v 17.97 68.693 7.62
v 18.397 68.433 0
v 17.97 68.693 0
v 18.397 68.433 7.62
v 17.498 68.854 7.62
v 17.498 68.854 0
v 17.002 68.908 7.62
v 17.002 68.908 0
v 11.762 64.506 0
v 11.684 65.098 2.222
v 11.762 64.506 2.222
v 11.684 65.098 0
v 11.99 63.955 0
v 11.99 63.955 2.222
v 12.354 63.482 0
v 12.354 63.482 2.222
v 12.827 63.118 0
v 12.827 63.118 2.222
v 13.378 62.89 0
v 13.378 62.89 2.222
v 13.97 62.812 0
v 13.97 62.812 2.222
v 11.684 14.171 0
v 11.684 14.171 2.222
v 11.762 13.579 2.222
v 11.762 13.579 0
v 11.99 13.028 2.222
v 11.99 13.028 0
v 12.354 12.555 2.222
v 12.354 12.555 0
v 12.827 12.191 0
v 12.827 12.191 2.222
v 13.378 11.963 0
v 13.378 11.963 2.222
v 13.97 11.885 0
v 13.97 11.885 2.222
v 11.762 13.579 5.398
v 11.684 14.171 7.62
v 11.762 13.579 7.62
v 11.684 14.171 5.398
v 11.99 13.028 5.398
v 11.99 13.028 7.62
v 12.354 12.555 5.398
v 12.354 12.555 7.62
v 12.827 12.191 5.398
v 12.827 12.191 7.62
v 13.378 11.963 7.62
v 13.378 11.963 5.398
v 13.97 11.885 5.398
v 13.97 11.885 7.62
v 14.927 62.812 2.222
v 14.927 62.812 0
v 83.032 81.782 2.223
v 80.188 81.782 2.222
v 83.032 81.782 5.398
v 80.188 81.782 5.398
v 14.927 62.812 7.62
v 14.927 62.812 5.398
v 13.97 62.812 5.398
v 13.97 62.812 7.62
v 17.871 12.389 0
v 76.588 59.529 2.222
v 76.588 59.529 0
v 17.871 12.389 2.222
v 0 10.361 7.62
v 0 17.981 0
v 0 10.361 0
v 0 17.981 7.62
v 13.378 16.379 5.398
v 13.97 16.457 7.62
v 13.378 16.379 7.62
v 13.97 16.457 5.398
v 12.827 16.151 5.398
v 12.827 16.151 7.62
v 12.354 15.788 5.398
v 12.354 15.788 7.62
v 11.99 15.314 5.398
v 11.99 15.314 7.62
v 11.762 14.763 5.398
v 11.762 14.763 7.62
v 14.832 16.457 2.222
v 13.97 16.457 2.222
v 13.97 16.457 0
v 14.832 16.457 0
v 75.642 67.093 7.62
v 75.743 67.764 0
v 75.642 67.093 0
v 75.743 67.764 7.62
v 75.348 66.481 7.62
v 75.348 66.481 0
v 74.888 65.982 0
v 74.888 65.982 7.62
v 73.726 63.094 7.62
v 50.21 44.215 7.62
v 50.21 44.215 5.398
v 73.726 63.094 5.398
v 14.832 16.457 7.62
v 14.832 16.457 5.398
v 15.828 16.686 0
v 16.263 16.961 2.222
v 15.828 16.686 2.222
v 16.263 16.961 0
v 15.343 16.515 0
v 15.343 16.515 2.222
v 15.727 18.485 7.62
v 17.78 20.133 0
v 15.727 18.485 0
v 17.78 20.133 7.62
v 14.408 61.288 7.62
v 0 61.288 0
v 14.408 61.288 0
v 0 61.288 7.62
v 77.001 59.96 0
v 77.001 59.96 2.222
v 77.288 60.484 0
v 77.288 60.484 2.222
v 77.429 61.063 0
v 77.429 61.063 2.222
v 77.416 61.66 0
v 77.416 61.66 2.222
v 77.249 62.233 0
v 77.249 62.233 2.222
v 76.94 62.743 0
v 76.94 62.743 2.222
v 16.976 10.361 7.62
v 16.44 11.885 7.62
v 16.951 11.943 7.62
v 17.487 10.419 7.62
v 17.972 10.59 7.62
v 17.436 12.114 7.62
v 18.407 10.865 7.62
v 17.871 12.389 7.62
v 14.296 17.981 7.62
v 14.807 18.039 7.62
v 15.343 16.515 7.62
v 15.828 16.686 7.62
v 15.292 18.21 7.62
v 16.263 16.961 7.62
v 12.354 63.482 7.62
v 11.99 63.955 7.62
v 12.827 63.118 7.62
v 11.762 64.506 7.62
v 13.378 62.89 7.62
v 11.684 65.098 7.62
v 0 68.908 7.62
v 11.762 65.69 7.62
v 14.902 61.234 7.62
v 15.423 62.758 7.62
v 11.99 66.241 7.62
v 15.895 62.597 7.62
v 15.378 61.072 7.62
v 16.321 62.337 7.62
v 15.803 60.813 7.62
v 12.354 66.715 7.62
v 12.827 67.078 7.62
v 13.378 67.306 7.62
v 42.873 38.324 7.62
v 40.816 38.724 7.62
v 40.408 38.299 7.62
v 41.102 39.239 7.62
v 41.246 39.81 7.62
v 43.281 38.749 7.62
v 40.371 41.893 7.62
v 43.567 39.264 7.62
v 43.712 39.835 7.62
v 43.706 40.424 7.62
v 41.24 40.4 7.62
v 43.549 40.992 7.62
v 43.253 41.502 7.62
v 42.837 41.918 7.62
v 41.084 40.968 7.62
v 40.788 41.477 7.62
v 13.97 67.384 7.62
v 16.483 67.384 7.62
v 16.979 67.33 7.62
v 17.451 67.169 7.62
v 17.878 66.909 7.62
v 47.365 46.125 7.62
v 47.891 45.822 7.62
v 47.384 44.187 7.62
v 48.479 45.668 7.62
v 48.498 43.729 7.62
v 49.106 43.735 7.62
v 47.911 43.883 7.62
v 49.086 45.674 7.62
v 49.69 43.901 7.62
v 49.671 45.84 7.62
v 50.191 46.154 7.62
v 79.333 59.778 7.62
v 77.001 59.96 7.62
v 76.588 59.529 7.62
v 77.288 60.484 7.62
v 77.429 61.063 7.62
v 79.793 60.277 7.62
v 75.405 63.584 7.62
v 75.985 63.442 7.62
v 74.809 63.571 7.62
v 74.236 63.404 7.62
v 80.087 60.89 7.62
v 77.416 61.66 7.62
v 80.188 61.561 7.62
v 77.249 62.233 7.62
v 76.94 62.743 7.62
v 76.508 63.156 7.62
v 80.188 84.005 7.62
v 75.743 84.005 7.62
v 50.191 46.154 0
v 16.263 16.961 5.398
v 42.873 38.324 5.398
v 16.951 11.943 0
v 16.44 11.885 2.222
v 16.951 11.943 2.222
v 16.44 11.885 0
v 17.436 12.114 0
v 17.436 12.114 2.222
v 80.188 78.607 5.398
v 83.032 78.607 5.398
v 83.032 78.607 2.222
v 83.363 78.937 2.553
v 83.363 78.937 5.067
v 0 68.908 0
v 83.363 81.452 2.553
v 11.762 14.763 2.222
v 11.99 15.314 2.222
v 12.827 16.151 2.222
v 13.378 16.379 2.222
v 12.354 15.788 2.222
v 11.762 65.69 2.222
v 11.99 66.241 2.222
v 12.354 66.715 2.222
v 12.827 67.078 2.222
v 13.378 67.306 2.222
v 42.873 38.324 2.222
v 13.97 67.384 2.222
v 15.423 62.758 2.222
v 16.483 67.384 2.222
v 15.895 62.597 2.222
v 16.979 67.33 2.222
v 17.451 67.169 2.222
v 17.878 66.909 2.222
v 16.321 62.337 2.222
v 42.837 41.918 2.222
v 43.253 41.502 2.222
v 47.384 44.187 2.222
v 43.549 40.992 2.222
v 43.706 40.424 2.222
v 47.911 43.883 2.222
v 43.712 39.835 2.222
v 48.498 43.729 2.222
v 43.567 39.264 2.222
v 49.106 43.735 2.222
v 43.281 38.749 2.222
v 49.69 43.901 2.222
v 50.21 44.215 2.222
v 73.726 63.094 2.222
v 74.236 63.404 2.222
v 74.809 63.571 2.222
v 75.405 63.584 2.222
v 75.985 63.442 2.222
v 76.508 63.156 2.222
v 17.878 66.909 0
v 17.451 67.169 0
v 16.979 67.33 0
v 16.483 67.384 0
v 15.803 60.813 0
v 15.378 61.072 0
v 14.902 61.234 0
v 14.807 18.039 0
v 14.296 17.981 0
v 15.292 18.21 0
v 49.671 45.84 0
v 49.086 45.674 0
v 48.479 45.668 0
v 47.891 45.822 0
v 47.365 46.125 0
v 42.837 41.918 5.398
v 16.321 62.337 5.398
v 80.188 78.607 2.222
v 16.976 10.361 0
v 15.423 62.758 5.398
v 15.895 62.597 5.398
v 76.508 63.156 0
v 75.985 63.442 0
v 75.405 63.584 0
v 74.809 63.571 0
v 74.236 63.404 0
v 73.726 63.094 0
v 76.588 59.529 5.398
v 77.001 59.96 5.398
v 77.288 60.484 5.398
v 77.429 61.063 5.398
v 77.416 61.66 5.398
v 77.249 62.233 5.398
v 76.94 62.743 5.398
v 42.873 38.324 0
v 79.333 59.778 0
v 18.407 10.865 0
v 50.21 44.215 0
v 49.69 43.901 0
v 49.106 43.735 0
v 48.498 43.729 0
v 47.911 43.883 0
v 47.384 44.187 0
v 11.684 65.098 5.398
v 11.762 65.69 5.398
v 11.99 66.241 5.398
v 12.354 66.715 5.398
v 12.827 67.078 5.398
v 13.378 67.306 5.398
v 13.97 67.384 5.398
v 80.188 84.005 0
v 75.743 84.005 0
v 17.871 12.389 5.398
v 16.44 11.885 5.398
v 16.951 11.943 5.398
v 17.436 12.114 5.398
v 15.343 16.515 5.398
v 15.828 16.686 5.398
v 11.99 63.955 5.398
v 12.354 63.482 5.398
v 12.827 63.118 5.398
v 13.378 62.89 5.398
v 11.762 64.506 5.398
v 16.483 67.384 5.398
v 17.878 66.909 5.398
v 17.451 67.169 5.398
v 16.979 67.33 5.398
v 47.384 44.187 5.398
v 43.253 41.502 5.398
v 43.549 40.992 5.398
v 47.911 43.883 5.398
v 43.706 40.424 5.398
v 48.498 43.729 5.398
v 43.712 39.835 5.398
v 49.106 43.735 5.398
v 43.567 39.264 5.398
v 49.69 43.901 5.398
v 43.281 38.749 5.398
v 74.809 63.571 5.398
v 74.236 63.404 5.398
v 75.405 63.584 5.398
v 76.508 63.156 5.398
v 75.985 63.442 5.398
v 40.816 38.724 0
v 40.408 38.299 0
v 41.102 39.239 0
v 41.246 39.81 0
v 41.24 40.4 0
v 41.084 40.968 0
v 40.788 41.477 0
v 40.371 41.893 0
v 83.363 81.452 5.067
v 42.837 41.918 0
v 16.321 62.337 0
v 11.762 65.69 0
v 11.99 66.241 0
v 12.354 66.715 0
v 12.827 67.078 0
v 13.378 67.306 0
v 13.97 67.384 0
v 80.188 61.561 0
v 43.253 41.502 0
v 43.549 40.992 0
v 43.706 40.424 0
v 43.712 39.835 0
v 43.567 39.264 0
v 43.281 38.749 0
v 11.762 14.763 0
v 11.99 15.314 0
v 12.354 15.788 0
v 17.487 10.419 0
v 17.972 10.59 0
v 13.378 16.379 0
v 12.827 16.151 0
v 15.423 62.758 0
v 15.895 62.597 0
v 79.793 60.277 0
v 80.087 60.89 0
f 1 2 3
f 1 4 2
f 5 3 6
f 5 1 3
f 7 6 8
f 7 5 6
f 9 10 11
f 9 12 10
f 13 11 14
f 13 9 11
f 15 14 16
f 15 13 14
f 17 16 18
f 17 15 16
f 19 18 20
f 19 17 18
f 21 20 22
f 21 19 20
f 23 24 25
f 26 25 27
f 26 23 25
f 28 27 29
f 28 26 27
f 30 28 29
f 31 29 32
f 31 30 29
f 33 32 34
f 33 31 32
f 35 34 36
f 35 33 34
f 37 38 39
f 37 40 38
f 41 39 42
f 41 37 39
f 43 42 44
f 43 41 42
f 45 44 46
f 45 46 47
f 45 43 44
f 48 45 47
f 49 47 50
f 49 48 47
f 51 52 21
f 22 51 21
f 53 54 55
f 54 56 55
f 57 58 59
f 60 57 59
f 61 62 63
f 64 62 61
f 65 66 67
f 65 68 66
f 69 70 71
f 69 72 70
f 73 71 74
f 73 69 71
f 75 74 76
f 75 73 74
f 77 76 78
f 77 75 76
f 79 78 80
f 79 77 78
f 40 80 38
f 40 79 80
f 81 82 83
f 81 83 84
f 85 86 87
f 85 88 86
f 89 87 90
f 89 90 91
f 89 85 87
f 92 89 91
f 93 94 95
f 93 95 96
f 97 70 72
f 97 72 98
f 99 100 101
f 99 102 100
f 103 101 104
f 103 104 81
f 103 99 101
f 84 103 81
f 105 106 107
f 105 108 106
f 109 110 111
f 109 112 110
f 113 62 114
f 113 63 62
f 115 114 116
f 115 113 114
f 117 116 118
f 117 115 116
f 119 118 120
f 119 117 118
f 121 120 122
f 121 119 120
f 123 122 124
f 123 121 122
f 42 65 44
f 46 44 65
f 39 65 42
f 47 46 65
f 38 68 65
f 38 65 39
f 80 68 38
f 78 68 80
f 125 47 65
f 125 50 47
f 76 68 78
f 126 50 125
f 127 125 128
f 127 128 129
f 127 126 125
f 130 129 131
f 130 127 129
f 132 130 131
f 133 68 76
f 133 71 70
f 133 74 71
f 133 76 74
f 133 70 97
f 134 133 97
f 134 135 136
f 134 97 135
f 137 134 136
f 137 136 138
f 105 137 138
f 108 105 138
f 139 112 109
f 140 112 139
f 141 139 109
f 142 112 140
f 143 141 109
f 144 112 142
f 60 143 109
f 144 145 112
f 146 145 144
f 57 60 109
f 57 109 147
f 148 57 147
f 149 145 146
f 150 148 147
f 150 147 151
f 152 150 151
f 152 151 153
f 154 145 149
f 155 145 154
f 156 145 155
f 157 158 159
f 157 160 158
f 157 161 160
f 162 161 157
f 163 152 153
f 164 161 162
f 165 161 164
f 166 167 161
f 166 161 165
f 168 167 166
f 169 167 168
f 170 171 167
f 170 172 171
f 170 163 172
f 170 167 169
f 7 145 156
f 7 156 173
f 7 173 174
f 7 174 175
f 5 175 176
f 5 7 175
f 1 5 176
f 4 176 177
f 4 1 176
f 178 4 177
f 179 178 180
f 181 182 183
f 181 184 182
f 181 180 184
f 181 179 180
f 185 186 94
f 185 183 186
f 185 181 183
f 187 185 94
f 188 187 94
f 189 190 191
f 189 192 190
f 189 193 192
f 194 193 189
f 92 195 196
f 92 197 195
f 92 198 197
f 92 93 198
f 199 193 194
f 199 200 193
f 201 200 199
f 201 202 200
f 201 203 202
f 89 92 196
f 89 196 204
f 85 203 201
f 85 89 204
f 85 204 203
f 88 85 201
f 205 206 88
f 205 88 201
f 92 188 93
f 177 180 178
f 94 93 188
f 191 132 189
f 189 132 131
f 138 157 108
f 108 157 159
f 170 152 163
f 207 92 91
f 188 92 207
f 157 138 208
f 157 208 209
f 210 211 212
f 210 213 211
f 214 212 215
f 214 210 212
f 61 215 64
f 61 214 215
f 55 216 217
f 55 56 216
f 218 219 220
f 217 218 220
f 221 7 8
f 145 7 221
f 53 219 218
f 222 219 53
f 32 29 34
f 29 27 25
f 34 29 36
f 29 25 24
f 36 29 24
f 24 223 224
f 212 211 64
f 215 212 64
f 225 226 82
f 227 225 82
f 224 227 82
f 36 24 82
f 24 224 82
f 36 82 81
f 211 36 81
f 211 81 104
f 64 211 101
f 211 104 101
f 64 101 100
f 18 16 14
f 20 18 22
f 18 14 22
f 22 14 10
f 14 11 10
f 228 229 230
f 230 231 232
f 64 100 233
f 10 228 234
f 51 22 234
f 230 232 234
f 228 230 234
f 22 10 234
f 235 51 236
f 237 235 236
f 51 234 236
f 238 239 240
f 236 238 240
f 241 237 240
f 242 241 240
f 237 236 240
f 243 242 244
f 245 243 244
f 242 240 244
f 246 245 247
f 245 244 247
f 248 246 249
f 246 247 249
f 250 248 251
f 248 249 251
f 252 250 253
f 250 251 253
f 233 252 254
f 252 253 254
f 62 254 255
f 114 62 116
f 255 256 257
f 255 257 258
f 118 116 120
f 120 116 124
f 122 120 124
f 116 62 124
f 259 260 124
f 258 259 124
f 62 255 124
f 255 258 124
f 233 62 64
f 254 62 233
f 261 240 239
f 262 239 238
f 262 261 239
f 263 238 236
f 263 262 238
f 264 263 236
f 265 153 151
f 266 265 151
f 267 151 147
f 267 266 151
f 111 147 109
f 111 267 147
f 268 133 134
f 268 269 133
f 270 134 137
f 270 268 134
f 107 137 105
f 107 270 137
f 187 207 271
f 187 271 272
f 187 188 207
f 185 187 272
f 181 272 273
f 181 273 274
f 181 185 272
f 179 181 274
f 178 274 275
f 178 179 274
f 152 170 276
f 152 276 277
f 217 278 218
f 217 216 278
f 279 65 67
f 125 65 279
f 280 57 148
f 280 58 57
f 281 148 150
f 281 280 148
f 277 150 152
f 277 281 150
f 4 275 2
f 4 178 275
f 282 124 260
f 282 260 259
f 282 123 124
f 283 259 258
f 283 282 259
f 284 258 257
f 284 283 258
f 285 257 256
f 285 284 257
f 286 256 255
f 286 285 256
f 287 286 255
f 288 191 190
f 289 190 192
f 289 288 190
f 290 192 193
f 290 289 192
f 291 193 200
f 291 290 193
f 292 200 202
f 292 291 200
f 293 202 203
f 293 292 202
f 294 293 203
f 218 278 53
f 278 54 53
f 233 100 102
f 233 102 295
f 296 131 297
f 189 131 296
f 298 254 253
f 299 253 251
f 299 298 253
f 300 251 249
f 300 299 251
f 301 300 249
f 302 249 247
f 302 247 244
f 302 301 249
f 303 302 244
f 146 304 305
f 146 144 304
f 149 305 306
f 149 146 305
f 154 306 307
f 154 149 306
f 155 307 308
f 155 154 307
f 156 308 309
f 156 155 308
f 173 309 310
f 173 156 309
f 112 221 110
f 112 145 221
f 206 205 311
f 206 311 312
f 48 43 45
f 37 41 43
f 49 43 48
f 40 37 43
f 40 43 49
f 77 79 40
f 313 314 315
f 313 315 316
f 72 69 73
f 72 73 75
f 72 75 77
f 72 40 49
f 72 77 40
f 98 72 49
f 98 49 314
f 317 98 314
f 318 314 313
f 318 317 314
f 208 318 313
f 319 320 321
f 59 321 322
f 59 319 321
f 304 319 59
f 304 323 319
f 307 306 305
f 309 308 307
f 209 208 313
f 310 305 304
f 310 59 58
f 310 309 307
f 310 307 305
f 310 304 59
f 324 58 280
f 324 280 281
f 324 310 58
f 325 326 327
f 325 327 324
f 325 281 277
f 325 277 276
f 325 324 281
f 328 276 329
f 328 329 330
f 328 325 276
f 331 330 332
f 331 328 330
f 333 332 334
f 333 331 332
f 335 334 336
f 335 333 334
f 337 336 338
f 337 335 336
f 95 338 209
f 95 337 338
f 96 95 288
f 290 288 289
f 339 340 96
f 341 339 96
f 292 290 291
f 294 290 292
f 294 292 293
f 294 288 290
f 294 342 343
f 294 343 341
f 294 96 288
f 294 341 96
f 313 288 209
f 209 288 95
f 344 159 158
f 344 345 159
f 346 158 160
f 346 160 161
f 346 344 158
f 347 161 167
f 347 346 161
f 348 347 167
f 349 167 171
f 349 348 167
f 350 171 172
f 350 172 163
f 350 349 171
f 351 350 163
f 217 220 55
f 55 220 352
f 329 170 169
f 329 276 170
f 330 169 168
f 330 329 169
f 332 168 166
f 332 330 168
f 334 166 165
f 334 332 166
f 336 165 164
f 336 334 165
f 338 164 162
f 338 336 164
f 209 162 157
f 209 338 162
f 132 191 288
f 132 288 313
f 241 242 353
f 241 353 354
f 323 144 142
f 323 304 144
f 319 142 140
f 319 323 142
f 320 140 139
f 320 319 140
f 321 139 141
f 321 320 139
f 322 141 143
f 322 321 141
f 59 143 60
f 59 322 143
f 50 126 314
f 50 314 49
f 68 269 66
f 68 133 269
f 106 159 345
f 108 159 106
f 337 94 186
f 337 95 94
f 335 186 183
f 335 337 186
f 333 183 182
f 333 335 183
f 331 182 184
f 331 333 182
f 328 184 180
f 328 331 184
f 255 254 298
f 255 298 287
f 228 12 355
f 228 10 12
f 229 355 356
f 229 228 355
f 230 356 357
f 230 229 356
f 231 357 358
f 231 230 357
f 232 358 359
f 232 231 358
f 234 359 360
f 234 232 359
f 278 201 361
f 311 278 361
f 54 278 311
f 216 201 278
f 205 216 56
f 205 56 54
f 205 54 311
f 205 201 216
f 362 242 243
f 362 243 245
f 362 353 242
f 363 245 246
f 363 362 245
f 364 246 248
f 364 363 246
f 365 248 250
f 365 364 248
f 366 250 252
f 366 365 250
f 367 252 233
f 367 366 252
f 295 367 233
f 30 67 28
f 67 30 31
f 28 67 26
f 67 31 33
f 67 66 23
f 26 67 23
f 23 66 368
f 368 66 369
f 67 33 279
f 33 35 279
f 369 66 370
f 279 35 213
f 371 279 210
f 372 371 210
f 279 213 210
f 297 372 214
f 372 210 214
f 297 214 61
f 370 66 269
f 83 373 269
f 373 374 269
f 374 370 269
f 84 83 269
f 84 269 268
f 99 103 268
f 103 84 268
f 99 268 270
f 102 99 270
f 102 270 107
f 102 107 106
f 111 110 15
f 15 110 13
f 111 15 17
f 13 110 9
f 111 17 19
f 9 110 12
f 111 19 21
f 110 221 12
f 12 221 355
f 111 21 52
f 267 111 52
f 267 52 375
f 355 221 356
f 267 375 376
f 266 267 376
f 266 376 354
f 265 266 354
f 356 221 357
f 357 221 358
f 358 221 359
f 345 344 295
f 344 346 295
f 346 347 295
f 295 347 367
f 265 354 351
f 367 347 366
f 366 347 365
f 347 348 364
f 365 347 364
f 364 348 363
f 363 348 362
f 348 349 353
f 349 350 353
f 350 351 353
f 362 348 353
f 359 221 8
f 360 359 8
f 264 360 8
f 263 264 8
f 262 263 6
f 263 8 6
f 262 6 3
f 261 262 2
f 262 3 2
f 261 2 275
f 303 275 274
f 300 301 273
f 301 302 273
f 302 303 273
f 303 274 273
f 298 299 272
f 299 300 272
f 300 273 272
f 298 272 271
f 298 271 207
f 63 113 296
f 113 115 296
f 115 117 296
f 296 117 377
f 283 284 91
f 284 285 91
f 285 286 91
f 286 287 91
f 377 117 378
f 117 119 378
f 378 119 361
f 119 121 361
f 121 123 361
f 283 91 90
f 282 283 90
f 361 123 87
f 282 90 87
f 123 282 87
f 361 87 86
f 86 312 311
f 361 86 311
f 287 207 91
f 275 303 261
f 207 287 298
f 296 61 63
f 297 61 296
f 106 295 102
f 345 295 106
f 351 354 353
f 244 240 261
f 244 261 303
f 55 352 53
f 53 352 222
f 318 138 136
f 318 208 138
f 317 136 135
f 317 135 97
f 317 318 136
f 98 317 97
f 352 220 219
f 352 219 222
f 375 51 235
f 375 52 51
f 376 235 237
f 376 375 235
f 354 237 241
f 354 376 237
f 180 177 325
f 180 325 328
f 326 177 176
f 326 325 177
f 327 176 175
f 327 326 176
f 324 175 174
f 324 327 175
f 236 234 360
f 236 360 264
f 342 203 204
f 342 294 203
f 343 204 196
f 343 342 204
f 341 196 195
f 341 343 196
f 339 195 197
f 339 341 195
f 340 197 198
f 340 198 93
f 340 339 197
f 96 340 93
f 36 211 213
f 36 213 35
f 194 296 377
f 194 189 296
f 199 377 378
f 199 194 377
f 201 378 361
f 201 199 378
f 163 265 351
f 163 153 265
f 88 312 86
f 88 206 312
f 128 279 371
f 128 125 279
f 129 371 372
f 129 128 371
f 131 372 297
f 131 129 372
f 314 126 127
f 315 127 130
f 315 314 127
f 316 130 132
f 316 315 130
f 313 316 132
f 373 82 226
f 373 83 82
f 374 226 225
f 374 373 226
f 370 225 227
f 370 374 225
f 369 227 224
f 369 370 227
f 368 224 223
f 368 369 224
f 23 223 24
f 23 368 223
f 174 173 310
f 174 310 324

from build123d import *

# Parameters (mm, degrees)
F1_DEPTH = 3.81
F2_DEPTH = 1.5875
F0_W     = 3.175
F0_H     = 3.175
F3_DEPTH = 1.5875
F4_R     = 2.28599
F5_SIZE  = 0.3302


# Not quite as in the source:
# - a fillet or chamfer is up to 0.001 mm smaller than in the source, because OpenCascade refuses the exact size


with BuildPart() as f1:
    # F0 (on Top) → F1 (new body, symmetric)
    with BuildSketch(Plane.XY):
        Polygon((0, 17.9811139863), (0, 10.3611139863), (17.78, 10.3611139863), (80.1876843047, 60.4647179591), (80.1876843047, 78.6070511723), (80.1876843047, 81.7820511723), (80.1876843047, 84.0045511723), (75.7426843047, 84.0045511723), (75.7426843047, 66.6679901496), (48.789068088, 45.0284544481), (17.78, 68.9081139863), (0, 68.9081139863), (0, 61.2881139863), (15.1859866786, 61.2881139863), (15.5029622538, 61.0440154278), (42.6746095935, 40.1195011625), (17.78, 20.1330255541), (15.0996375684, 17.9811139863), align=None)
        Polygon((11.684, 67.3841139863), (17.2611973357, 67.3841139863), (48.8086871908, 43.0898232038), (75.5083847301, 64.5255019445), (78.3706676759, 60.9603202747), (17.2439275137, 11.8851139863), (11.684, 11.8851139863), (11.684, 16.4571139863), (15.6357100547, 16.4571139863), (45.1400120941, 40.1444512324), (15.7047893428, 62.8121139863), (11.684, 62.8121139863), align=None, mode=Mode.SUBTRACT)
    extrude(amount=F1_DEPTH, both=True)

    # F0 (on Top) → F2 (join, symmetric)
    with BuildSketch(Plane.XY):
        Polygon((48.8086871908, 43.0898232038), (17.2611973357, 67.3841139863), (11.684, 67.3841139863), (11.684, 62.8121139863), (15.7047893428, 62.8121139863), (45.1400120941, 40.1444512324), (15.6357100547, 16.4571139863), (11.684, 16.4571139863), (11.684, 11.8851139863), (17.2439275137, 11.8851139863), (78.3706676759, 60.9603202747), (75.5083847301, 64.5255019445), align=None)
    extrude(amount=F2_DEPTH, both=True)

    # F0 (on Top) → F3 (join, symmetric)
    with BuildSketch(Plane.XY):
        with Locations((81.7751843047, 80.1945511723)):
            Rectangle(F0_W, F0_H)
    extrude(amount=F3_DEPTH, both=True)

    # F4 (radius 2.286 in the source; OpenCascade refuses exactly that, so slightly less here)
    f4_edges = [f1.edges().sort_by_distance(p)[0] for p in [
        (15.185987, 61.288114, 0),
        (11.684, 62.812114, 2.69875),
        (15.704789, 62.812114, 2.69875),
        (11.684, 67.384114, 2.69875),
        (17.261197, 67.384114, 2.69875),
        (17.78, 68.908114, 0),
        (15.704789, 62.812114, -2.69875),
        (11.684, 62.812114, -2.69875),
        (11.684, 67.384114, -2.69875),
        (17.261197, 67.384114, -2.69875),
        (48.808687, 43.089823, 2.69875),
        (45.140012, 40.144451, 2.69875),
        (42.67461, 40.119501, 0),
        (48.789068, 45.028454, 0),
        (48.808687, 43.089823, -2.69875),
        (45.140012, 40.144451, -2.69875),
        (75.508385, 64.525502, -2.69875),
        (78.370668, 60.96032, -2.69875),
        (80.187684, 60.464718, 0),
        (75.742684, 66.66799, 0),
        (78.370668, 60.96032, 2.69875),
        (75.508385, 64.525502, 2.69875),
        (15.63571, 16.457114, 2.69875),
        (11.684, 16.457114, 2.69875),
        (11.684, 11.885114, 2.69875),
        (17.243928, 11.885114, 2.69875),
        (11.684, 16.457114, -2.69875),
        (15.63571, 16.457114, -2.69875),
        (17.243928, 11.885114, -2.69875),
        (11.684, 11.885114, -2.69875),
        (17.78, 10.361114, 0),
        (15.099638, 17.981114, 0),
    ]]
    fillet(f4_edges, radius=F4_R)

    # F5
    f5_edges = [f1.edges().sort_by_distance(p)[0] for p in [
        (83.362684, 78.607051, 0),
        (83.362684, 80.194551, -1.5875),
        (83.362684, 81.782051, 0),
        (83.362684, 80.194551, 1.5875),
    ]]
    chamfer(f5_edges, length=F5_SIZE)


with BuildPart() as f1_1:
    # F6: moved
    add(f1.part.moved(Location((0, 0, 3.81))))


solid = f1_1.part
